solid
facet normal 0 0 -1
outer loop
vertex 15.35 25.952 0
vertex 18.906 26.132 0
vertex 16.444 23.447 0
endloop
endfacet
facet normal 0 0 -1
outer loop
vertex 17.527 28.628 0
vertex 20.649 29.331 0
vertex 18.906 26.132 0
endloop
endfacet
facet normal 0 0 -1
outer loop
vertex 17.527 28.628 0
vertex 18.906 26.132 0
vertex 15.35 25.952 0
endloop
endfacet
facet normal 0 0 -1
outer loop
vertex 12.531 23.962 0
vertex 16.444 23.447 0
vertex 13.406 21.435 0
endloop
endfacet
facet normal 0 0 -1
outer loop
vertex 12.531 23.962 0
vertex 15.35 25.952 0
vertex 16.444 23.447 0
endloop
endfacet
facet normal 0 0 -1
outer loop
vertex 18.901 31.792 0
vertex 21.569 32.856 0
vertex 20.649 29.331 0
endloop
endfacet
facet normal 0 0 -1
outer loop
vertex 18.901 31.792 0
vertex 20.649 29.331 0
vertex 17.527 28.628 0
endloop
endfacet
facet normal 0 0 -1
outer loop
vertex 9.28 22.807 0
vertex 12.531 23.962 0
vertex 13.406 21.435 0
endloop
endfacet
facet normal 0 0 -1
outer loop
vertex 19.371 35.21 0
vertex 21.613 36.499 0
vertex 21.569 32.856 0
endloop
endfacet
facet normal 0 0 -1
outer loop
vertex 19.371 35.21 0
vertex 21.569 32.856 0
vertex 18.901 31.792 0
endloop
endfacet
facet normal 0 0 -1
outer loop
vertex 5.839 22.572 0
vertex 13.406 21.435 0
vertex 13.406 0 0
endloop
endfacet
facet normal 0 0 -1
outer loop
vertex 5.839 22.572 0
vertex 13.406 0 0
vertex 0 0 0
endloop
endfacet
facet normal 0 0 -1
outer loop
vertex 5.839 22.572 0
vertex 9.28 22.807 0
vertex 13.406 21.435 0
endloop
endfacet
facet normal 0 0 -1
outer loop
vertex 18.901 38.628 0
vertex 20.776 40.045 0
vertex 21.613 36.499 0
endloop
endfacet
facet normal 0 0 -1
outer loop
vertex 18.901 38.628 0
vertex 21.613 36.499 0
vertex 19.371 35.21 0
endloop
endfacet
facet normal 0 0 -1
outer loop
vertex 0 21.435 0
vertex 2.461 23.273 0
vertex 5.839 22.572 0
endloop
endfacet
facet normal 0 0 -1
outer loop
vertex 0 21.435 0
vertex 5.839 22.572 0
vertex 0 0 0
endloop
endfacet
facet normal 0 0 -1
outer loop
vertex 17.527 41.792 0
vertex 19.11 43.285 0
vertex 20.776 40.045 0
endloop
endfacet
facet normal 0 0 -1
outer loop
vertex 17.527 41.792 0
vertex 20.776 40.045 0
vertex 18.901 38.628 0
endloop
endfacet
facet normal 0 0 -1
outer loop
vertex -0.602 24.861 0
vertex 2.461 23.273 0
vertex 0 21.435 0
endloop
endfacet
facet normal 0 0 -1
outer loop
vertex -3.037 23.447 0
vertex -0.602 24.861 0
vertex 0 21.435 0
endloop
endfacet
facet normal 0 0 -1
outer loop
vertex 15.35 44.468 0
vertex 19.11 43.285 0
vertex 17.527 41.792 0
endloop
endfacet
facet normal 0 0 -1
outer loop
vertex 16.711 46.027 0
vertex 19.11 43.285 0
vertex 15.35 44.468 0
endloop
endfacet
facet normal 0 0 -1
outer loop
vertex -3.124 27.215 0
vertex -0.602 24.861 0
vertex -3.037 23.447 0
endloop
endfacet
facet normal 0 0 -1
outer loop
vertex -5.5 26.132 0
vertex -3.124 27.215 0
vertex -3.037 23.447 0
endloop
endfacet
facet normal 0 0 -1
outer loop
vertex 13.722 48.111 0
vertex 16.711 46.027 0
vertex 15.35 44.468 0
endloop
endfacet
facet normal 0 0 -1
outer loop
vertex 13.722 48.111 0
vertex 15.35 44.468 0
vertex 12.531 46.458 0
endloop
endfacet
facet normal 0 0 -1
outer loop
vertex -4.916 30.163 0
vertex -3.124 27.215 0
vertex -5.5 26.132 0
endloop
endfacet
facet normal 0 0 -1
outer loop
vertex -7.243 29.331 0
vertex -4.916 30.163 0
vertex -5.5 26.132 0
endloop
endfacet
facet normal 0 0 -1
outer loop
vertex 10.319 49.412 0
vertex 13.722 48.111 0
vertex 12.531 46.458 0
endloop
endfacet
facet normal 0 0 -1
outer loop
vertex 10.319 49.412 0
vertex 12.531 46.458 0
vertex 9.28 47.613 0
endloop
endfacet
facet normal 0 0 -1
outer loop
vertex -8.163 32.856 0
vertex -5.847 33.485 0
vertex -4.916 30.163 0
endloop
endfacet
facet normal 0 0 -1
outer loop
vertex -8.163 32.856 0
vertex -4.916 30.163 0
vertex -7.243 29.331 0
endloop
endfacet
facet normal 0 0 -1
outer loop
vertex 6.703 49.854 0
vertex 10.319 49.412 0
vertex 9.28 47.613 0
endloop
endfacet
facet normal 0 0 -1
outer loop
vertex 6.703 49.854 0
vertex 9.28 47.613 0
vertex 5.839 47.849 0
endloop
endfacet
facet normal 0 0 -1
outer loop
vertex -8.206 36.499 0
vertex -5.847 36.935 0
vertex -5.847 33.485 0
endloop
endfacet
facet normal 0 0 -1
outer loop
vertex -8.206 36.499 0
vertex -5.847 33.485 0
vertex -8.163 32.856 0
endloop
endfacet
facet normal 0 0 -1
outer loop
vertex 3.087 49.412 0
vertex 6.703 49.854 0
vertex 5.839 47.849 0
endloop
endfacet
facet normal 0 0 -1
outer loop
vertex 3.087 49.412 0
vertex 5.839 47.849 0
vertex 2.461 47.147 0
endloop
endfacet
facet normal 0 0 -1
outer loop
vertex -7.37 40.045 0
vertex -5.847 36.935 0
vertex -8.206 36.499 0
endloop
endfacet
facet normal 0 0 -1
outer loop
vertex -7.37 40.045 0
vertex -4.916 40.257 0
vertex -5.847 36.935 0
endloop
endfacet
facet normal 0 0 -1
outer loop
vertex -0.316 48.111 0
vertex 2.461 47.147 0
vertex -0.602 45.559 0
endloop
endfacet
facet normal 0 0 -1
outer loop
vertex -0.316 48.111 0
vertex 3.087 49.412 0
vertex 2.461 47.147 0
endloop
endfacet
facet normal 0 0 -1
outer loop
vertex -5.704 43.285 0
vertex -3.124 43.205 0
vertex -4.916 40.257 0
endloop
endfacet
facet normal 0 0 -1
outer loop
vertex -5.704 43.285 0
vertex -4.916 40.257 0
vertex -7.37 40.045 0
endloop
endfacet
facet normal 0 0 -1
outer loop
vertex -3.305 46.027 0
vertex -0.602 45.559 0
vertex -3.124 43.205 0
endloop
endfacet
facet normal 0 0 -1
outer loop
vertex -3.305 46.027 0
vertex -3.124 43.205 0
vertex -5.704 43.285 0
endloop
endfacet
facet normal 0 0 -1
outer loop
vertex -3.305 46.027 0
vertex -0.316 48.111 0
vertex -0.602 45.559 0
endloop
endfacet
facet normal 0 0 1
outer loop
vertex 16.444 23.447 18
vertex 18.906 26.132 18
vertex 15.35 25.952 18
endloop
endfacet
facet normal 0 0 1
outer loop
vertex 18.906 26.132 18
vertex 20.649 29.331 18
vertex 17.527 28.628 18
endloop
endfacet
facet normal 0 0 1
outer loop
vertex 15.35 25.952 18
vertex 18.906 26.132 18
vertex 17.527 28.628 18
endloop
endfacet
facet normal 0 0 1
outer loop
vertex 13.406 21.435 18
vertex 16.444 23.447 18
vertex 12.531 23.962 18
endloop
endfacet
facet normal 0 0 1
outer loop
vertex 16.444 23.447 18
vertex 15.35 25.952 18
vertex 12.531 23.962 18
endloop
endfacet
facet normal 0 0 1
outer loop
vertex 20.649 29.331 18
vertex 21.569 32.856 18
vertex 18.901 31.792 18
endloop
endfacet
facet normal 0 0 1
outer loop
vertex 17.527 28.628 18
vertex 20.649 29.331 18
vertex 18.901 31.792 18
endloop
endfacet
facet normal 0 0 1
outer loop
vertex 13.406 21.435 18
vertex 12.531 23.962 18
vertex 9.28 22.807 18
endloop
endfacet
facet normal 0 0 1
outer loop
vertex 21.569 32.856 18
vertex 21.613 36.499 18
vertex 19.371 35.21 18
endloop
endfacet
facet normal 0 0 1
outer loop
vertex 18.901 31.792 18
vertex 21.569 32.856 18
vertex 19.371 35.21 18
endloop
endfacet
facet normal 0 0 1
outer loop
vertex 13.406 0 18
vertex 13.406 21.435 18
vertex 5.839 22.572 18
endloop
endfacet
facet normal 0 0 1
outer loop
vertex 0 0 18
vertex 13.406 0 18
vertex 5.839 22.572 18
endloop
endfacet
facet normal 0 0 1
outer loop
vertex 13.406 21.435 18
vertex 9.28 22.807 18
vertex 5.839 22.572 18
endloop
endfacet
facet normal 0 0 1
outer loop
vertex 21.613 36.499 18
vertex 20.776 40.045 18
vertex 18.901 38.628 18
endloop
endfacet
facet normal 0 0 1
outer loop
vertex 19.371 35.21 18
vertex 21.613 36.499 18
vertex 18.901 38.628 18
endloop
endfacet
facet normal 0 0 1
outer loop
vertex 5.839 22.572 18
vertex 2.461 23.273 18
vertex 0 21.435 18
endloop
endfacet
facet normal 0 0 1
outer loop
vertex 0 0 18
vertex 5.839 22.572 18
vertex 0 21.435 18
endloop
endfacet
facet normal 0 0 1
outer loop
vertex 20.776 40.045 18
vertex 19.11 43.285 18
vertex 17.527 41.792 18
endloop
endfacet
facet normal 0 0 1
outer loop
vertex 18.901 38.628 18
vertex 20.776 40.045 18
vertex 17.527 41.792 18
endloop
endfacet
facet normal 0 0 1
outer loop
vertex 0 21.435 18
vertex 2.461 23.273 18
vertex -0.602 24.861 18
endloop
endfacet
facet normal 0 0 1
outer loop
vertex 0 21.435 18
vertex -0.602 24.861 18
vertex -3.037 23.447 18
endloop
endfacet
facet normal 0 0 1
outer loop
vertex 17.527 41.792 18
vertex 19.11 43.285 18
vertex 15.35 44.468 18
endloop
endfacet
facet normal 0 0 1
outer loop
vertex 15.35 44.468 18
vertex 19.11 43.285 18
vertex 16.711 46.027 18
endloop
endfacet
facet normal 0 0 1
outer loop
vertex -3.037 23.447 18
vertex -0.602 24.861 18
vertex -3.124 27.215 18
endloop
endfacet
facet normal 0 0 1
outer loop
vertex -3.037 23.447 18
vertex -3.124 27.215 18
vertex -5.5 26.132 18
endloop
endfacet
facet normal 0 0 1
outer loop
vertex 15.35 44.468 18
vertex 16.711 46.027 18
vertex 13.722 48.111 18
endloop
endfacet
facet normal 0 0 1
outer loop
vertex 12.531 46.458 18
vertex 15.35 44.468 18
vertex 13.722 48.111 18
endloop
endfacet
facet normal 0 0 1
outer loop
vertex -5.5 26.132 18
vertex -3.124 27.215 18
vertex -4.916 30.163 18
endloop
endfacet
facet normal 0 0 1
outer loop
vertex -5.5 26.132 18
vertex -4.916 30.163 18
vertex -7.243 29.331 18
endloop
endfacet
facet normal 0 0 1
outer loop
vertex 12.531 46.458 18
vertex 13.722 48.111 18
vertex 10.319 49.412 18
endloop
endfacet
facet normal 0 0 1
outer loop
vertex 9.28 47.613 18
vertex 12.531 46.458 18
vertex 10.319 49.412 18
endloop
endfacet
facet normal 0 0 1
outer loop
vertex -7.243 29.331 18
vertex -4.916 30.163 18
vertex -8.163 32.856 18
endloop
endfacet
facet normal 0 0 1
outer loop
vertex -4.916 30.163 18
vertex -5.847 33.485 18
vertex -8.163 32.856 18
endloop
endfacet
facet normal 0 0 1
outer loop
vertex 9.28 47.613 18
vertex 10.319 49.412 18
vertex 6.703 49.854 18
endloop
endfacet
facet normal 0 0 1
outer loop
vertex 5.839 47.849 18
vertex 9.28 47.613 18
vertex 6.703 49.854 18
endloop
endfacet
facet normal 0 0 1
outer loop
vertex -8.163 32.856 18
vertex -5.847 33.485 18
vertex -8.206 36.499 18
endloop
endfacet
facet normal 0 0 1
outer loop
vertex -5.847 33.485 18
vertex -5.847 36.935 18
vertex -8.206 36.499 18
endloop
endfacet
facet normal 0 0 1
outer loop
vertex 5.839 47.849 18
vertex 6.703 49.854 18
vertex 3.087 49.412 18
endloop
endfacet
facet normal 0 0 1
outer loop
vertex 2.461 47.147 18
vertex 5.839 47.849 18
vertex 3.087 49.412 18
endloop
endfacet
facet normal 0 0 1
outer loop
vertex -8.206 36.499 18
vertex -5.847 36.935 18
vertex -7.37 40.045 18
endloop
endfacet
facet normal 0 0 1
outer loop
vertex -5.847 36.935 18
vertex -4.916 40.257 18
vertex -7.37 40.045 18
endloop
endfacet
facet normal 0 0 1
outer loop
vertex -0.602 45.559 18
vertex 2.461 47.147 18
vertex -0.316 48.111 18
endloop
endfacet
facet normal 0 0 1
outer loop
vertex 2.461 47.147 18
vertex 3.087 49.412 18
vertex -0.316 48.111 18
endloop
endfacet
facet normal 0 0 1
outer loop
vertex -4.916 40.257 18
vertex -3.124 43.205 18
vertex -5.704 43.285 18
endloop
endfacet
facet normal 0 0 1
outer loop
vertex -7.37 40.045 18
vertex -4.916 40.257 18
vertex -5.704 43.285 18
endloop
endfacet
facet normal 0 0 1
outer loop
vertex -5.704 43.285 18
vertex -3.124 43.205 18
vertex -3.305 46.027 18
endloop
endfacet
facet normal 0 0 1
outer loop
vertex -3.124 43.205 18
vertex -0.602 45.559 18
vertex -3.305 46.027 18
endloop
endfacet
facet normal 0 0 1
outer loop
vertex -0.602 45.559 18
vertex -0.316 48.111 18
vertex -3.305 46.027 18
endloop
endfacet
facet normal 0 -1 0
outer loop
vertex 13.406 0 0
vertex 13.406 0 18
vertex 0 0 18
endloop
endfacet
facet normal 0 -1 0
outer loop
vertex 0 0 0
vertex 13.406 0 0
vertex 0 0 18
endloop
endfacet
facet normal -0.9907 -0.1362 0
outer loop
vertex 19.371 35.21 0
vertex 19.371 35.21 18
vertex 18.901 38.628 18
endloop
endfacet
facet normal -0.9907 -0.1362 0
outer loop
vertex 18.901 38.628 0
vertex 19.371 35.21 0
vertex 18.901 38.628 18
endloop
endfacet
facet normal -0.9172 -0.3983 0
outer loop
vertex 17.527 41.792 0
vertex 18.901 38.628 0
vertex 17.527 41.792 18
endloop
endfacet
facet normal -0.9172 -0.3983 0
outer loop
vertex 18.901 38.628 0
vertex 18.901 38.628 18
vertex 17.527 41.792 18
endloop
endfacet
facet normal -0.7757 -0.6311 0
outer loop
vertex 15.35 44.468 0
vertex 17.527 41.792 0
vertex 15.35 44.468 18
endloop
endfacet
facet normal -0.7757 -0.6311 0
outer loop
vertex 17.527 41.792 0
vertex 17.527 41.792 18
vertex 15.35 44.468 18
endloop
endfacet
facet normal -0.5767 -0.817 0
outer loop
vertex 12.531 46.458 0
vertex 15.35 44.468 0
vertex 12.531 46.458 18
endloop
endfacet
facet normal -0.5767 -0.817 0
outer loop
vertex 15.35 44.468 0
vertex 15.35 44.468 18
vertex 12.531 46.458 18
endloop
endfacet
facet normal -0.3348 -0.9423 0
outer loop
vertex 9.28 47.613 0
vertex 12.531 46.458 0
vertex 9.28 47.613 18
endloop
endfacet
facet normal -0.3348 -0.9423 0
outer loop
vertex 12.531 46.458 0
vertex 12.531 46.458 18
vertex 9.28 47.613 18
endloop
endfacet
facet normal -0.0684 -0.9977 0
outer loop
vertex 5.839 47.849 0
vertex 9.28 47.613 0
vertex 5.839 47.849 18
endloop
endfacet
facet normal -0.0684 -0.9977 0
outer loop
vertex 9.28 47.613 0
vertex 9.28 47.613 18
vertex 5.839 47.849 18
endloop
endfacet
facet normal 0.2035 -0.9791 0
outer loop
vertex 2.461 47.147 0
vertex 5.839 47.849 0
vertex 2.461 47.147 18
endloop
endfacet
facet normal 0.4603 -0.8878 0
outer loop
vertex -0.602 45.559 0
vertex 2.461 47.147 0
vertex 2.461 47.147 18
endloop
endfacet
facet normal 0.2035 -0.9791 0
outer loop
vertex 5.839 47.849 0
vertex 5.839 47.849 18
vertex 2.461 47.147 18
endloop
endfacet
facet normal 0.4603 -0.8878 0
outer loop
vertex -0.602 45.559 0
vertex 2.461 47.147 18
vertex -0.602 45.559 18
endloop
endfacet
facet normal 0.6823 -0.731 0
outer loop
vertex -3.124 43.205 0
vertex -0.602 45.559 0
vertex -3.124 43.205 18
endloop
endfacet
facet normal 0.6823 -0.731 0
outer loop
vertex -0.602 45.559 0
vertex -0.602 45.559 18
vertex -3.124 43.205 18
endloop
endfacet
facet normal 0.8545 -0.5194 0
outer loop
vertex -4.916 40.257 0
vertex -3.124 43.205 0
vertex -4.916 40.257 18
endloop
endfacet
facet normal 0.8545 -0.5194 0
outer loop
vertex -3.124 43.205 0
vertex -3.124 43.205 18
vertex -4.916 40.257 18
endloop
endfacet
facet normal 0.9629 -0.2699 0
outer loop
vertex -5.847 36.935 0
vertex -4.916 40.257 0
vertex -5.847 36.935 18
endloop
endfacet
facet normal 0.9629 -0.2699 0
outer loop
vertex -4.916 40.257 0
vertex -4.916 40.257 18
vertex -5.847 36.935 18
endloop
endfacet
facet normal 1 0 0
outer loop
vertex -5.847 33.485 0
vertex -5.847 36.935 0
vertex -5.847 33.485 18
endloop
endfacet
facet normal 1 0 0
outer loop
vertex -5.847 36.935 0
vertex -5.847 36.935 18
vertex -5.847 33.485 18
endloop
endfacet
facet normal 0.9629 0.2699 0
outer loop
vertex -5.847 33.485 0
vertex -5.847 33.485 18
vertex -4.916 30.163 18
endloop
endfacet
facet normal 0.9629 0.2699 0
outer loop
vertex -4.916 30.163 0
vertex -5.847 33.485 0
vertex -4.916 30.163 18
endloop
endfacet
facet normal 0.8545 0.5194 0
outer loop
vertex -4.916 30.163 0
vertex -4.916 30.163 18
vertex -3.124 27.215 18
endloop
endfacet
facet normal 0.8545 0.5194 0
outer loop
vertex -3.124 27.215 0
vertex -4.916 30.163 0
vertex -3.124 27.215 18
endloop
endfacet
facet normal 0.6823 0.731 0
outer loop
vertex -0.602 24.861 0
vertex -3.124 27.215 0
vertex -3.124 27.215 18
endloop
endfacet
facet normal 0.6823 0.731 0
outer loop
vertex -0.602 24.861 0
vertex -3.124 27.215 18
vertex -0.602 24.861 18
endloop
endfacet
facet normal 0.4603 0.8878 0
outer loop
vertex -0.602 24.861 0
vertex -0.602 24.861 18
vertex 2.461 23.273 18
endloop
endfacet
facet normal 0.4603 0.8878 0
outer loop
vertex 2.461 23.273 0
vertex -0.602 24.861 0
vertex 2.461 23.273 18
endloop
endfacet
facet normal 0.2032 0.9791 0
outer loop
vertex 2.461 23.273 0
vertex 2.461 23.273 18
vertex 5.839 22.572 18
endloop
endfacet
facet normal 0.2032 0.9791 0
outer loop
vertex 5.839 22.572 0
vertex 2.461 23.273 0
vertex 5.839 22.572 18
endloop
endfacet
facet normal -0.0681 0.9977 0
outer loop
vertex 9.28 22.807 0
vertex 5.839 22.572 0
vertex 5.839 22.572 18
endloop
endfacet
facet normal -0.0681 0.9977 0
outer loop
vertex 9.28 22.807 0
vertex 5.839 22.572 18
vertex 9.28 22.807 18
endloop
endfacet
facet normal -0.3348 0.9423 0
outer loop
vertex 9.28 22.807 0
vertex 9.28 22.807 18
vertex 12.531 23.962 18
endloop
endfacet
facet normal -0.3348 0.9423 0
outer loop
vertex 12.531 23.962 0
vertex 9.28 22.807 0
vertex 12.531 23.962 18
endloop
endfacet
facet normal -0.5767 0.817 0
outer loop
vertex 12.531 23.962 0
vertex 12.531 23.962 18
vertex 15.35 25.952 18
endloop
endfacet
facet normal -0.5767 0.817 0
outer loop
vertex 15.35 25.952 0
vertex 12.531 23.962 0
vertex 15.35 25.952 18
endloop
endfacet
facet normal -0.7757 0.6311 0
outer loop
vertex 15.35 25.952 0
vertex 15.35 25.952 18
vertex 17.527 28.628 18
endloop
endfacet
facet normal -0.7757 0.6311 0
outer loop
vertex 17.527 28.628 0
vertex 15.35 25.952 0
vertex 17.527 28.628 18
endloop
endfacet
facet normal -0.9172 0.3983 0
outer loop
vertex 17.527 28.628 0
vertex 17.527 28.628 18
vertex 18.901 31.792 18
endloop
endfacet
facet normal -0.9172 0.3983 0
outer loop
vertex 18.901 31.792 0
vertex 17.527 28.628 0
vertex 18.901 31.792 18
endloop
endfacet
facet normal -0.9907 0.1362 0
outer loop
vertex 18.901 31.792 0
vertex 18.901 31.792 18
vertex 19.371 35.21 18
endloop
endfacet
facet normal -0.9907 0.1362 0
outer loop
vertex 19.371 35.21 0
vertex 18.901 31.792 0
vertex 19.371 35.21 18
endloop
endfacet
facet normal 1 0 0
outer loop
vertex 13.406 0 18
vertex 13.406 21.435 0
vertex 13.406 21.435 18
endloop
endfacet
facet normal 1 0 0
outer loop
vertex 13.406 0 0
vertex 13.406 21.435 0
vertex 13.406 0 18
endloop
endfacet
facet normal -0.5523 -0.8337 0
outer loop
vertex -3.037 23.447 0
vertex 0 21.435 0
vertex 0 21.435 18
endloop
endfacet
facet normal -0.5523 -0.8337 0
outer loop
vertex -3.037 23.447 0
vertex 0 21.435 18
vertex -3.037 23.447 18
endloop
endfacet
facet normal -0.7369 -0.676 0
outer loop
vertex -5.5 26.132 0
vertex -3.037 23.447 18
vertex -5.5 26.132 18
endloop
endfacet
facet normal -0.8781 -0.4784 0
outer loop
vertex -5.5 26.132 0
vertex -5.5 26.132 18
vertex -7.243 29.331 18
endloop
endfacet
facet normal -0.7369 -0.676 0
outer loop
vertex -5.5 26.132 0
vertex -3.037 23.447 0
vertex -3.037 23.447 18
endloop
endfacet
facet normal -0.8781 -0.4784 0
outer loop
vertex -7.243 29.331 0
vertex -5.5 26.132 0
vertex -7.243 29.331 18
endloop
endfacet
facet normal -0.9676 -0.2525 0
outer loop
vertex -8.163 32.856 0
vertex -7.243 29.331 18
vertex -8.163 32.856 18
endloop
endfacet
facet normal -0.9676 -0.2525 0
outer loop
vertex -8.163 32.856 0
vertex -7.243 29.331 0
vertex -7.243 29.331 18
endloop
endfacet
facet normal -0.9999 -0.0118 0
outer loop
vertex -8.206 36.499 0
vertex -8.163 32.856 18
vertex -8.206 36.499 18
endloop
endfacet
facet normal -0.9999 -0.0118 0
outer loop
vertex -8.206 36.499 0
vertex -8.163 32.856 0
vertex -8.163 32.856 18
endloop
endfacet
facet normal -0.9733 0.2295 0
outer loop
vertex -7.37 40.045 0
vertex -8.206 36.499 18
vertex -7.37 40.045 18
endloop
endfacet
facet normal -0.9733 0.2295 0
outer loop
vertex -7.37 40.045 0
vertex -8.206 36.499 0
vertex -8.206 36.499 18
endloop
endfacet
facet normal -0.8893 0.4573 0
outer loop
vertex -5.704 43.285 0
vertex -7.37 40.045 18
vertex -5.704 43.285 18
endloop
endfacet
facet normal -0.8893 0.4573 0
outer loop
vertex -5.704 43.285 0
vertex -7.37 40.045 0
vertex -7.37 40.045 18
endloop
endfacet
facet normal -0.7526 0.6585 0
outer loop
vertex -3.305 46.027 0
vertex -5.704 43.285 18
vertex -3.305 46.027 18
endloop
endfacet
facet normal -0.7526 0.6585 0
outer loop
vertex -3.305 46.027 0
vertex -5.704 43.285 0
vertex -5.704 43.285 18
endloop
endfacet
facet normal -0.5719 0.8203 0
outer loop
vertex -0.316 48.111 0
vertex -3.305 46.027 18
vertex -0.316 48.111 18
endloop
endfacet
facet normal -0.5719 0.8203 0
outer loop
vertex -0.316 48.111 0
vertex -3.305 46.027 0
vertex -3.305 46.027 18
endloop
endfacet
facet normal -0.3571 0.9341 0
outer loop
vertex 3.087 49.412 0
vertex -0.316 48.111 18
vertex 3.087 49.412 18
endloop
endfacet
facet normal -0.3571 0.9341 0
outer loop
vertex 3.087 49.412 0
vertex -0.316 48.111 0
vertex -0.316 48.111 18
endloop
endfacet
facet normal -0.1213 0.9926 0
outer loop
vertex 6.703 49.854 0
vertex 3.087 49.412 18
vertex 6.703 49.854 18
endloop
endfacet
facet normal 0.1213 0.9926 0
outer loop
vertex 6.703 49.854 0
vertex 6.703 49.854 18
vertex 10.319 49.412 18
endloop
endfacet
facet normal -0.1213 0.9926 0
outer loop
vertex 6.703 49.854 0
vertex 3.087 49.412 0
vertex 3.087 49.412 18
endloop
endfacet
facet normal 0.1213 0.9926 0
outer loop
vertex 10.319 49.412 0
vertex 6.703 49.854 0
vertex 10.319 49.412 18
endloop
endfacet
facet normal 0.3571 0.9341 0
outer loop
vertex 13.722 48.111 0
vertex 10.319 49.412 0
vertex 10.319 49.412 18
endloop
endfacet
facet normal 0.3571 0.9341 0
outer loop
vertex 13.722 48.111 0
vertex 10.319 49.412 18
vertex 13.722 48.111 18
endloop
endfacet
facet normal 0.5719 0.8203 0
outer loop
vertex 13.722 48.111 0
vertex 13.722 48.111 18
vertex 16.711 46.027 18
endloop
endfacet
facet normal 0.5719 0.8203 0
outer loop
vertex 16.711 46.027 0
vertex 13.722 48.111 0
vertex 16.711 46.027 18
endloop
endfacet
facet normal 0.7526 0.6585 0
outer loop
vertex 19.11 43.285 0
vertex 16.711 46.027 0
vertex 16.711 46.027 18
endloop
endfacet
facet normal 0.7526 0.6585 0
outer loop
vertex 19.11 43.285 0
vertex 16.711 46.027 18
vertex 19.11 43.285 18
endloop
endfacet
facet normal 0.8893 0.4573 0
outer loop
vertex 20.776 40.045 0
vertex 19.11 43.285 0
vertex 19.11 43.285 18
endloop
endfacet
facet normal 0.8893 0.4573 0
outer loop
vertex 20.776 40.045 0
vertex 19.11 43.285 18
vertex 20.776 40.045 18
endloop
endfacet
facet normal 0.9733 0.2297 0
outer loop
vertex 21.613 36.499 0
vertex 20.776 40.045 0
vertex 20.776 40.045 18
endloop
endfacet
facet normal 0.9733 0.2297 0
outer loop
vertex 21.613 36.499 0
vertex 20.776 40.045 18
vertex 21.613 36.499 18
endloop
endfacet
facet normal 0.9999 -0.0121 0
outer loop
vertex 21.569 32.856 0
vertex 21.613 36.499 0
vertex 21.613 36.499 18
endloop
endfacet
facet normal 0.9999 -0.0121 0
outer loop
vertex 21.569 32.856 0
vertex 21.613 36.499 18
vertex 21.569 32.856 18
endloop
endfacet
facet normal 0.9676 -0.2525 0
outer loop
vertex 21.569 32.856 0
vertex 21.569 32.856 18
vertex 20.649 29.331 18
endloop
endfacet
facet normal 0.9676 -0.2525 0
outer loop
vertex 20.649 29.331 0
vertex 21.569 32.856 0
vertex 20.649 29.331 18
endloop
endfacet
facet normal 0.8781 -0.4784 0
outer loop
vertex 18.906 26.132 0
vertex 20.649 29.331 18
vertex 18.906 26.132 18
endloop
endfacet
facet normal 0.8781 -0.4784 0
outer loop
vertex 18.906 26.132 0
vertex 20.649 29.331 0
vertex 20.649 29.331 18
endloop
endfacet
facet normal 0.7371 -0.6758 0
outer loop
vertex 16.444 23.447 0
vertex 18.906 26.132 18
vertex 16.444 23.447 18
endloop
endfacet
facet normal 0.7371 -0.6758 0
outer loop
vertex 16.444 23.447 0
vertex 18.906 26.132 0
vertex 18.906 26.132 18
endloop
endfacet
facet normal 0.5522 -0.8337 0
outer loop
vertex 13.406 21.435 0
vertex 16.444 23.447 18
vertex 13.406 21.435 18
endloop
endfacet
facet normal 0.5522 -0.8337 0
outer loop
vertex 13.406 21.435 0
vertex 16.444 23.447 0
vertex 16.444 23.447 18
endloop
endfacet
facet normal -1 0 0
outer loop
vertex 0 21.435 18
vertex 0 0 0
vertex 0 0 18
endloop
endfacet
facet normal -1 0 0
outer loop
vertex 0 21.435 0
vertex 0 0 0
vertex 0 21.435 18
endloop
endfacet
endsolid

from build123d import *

# Parameters (mm, degrees)
RESSALTO_EXTRUS_O1_DEPTH = 18
ESBO_O3_R                = 12.668025565
CORTE_EXTRUS_O2_DEPTH    = 58.275422957


with BuildPart() as part:
    # Esboço1 → Ressalto-extrusão1 (new body)
    with BuildSketch(Plane.XY):
        with BuildLine():
            Line((0, 0), (0, 21.43532158))
            ThreePointArc((0, 21.43532158), (6.703057614, 49.854301371), (13.406115228, 21.43532158))
            Line((13.406115228, 21.43532158), (13.406115228, 0))
            Line((13.406115228, 0), (0, 0))
        make_face()
    extrude(amount=RESSALTO_EXTRUS_O1_DEPTH)

    # Esboço3 → Corte-extrusão2 (cut, through all)
    with BuildSketch(Plane.XY.offset(18)):
        with Locations((6.703057614, 35.210084405)):
            Circle(ESBO_O3_R)
    extrude(amount=-CORTE_EXTRUS_O2_DEPTH, mode=Mode.SUBTRACT)


solid = part.part
